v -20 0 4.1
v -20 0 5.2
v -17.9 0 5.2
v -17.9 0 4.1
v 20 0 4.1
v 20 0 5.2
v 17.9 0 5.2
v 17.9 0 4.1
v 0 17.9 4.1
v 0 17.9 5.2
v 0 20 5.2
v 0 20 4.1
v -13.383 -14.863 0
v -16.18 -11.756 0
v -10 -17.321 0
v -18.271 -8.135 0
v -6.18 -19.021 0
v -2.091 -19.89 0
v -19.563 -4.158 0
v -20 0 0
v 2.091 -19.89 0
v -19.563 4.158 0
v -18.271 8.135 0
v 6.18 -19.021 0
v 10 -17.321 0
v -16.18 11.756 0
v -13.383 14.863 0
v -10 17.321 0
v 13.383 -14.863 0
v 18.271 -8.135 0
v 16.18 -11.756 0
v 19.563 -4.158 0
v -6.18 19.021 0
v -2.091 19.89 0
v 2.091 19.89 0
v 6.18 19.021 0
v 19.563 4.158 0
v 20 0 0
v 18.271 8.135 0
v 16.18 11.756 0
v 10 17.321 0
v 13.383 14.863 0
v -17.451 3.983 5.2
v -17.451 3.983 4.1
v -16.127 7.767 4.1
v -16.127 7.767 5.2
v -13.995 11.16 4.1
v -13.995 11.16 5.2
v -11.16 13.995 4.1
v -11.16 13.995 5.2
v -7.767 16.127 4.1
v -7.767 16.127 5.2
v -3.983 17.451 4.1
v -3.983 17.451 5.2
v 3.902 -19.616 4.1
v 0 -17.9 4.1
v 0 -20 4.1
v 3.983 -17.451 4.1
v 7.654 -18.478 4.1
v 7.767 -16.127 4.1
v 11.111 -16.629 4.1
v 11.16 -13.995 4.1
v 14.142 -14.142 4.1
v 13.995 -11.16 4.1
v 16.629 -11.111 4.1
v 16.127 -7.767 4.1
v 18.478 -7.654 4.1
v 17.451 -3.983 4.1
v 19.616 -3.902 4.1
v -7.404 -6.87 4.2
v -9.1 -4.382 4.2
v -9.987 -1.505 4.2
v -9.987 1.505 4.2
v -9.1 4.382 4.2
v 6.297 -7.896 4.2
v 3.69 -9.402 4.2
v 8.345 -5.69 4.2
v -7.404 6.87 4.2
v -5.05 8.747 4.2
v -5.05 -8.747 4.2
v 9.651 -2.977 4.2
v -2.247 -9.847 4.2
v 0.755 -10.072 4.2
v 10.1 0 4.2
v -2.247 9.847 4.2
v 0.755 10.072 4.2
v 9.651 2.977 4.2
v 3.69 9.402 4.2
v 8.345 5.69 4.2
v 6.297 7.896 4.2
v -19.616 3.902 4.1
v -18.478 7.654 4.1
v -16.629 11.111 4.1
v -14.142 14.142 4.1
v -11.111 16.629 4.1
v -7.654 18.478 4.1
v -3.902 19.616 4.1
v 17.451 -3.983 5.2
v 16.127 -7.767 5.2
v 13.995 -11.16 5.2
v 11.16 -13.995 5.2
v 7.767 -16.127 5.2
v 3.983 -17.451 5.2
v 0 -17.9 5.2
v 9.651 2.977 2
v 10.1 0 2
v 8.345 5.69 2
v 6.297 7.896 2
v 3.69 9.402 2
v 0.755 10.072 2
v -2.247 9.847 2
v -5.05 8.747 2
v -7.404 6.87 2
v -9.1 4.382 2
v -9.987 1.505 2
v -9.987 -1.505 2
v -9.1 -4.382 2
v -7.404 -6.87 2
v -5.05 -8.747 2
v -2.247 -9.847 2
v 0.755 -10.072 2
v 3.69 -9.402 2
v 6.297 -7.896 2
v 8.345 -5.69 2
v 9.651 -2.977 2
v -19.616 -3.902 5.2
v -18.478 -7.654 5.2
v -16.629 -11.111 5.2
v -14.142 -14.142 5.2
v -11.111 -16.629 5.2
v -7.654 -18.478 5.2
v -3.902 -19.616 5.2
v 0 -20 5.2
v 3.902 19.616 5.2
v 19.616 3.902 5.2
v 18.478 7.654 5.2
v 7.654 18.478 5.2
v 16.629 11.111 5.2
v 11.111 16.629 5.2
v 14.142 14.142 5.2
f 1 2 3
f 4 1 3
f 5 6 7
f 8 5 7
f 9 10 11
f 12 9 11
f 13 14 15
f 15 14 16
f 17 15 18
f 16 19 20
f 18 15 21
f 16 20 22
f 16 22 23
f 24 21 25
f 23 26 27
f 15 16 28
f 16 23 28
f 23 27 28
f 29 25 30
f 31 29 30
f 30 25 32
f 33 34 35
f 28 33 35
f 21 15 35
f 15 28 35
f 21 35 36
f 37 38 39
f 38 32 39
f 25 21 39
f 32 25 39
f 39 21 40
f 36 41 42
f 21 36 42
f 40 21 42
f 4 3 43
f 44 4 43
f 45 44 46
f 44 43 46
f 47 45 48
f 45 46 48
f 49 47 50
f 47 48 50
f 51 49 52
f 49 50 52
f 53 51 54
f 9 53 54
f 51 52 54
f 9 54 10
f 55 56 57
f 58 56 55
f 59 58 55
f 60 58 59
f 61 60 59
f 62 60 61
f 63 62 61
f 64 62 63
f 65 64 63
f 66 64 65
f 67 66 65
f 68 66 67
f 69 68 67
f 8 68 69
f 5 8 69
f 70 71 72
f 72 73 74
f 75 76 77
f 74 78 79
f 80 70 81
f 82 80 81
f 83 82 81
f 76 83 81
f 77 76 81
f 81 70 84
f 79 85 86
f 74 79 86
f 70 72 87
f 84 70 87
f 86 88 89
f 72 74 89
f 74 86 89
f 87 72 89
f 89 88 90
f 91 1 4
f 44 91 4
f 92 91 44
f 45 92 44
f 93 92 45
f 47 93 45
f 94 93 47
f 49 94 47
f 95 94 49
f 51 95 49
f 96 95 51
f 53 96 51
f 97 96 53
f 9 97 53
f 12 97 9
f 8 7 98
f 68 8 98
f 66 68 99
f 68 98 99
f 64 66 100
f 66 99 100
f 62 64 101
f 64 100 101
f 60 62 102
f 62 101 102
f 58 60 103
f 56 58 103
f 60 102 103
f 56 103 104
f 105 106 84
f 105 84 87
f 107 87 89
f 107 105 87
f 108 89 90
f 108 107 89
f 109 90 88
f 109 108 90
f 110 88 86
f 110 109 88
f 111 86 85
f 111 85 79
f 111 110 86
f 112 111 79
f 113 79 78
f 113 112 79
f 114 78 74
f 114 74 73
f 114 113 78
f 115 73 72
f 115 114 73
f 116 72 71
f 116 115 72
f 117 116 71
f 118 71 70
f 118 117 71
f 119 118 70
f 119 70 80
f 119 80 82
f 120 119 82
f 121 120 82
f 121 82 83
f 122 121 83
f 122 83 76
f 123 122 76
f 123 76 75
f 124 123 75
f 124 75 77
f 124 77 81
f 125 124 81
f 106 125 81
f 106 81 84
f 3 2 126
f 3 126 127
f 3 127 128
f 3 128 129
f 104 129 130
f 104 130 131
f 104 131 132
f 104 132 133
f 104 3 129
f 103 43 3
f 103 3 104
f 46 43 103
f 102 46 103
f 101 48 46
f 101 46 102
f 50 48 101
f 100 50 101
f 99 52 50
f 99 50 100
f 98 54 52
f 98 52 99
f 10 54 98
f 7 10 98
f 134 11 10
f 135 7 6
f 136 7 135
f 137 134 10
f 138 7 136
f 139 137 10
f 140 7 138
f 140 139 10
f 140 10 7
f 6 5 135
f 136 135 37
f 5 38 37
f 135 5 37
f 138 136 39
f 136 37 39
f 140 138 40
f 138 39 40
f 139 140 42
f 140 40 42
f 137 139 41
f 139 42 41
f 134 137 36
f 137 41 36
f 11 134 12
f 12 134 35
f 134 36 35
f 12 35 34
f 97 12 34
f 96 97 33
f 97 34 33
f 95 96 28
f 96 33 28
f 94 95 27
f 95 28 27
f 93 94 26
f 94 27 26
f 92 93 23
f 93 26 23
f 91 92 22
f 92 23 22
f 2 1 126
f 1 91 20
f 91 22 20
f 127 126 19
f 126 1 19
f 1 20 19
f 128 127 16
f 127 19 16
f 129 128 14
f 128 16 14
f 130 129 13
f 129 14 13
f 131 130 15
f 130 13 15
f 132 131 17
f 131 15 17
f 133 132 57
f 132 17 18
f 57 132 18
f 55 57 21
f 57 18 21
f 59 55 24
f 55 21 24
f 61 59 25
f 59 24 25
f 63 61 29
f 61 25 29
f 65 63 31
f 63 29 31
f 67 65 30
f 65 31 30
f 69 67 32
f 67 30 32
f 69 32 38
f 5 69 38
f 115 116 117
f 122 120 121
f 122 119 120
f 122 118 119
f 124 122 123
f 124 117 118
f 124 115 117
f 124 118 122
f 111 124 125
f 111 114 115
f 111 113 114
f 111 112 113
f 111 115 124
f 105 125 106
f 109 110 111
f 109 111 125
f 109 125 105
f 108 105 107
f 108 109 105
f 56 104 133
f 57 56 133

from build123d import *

# Parameters (mm, degrees)
F0_R     = 20
F0_R_2   = 10.1
F1_DEPTH = 2
F2_DEPTH = 4.2
F3_R     = 20
F3_R_2   = 10.1
F4_DEPTH = 1
F6_DEPTH = 1.1


with BuildPart() as f1:
    # F0 (on Top) → F1 (new body)
    with BuildSketch(Plane.XY):
        Circle(F0_R)
        Circle(F0_R_2, mode=Mode.SUBTRACT)
        Circle(F0_R_2)
    extrude(amount=F1_DEPTH)

    # F0 (on Top) → F2 (join)
    with BuildSketch(Plane.XY):
        Circle(F0_R)
        Circle(F0_R_2, mode=Mode.SUBTRACT)
    extrude(amount=F2_DEPTH)

    # F3 (on face) → F4 (join)
    with BuildSketch(Plane.XY.offset(4.2)):
        Circle(F3_R)
        Circle(F3_R_2, mode=Mode.SUBTRACT)
        Circle(F3_R_2)
    extrude(amount=F4_DEPTH)

    # F5 (on face) → F6 (cut)
    with BuildSketch(Plane.XY.offset(5.2)):
        with BuildLine():
            ThreePointArc((0, 20), (-14.1421356237, 14.1421356237), (-20, 0))
            Line((-20, 0), (-17.9, 0))
            ThreePointArc((-17.9, 0), (-12.6572113832, 12.6572113832), (0, 17.9))
            Line((0, 17.9), (0, 20))
        make_face()
        with BuildLine():
            Line((0, -17.9), (0, -20))
            ThreePointArc((0, -20), (14.1421356237, -14.1421356237), (20, 0))
            Line((20, 0), (17.9, 0))
            ThreePointArc((17.9, 0), (12.6572113832, -12.6572113832), (0, -17.9))
        make_face()
    extrude(amount=-F6_DEPTH, mode=Mode.SUBTRACT)


solid = f1.part
